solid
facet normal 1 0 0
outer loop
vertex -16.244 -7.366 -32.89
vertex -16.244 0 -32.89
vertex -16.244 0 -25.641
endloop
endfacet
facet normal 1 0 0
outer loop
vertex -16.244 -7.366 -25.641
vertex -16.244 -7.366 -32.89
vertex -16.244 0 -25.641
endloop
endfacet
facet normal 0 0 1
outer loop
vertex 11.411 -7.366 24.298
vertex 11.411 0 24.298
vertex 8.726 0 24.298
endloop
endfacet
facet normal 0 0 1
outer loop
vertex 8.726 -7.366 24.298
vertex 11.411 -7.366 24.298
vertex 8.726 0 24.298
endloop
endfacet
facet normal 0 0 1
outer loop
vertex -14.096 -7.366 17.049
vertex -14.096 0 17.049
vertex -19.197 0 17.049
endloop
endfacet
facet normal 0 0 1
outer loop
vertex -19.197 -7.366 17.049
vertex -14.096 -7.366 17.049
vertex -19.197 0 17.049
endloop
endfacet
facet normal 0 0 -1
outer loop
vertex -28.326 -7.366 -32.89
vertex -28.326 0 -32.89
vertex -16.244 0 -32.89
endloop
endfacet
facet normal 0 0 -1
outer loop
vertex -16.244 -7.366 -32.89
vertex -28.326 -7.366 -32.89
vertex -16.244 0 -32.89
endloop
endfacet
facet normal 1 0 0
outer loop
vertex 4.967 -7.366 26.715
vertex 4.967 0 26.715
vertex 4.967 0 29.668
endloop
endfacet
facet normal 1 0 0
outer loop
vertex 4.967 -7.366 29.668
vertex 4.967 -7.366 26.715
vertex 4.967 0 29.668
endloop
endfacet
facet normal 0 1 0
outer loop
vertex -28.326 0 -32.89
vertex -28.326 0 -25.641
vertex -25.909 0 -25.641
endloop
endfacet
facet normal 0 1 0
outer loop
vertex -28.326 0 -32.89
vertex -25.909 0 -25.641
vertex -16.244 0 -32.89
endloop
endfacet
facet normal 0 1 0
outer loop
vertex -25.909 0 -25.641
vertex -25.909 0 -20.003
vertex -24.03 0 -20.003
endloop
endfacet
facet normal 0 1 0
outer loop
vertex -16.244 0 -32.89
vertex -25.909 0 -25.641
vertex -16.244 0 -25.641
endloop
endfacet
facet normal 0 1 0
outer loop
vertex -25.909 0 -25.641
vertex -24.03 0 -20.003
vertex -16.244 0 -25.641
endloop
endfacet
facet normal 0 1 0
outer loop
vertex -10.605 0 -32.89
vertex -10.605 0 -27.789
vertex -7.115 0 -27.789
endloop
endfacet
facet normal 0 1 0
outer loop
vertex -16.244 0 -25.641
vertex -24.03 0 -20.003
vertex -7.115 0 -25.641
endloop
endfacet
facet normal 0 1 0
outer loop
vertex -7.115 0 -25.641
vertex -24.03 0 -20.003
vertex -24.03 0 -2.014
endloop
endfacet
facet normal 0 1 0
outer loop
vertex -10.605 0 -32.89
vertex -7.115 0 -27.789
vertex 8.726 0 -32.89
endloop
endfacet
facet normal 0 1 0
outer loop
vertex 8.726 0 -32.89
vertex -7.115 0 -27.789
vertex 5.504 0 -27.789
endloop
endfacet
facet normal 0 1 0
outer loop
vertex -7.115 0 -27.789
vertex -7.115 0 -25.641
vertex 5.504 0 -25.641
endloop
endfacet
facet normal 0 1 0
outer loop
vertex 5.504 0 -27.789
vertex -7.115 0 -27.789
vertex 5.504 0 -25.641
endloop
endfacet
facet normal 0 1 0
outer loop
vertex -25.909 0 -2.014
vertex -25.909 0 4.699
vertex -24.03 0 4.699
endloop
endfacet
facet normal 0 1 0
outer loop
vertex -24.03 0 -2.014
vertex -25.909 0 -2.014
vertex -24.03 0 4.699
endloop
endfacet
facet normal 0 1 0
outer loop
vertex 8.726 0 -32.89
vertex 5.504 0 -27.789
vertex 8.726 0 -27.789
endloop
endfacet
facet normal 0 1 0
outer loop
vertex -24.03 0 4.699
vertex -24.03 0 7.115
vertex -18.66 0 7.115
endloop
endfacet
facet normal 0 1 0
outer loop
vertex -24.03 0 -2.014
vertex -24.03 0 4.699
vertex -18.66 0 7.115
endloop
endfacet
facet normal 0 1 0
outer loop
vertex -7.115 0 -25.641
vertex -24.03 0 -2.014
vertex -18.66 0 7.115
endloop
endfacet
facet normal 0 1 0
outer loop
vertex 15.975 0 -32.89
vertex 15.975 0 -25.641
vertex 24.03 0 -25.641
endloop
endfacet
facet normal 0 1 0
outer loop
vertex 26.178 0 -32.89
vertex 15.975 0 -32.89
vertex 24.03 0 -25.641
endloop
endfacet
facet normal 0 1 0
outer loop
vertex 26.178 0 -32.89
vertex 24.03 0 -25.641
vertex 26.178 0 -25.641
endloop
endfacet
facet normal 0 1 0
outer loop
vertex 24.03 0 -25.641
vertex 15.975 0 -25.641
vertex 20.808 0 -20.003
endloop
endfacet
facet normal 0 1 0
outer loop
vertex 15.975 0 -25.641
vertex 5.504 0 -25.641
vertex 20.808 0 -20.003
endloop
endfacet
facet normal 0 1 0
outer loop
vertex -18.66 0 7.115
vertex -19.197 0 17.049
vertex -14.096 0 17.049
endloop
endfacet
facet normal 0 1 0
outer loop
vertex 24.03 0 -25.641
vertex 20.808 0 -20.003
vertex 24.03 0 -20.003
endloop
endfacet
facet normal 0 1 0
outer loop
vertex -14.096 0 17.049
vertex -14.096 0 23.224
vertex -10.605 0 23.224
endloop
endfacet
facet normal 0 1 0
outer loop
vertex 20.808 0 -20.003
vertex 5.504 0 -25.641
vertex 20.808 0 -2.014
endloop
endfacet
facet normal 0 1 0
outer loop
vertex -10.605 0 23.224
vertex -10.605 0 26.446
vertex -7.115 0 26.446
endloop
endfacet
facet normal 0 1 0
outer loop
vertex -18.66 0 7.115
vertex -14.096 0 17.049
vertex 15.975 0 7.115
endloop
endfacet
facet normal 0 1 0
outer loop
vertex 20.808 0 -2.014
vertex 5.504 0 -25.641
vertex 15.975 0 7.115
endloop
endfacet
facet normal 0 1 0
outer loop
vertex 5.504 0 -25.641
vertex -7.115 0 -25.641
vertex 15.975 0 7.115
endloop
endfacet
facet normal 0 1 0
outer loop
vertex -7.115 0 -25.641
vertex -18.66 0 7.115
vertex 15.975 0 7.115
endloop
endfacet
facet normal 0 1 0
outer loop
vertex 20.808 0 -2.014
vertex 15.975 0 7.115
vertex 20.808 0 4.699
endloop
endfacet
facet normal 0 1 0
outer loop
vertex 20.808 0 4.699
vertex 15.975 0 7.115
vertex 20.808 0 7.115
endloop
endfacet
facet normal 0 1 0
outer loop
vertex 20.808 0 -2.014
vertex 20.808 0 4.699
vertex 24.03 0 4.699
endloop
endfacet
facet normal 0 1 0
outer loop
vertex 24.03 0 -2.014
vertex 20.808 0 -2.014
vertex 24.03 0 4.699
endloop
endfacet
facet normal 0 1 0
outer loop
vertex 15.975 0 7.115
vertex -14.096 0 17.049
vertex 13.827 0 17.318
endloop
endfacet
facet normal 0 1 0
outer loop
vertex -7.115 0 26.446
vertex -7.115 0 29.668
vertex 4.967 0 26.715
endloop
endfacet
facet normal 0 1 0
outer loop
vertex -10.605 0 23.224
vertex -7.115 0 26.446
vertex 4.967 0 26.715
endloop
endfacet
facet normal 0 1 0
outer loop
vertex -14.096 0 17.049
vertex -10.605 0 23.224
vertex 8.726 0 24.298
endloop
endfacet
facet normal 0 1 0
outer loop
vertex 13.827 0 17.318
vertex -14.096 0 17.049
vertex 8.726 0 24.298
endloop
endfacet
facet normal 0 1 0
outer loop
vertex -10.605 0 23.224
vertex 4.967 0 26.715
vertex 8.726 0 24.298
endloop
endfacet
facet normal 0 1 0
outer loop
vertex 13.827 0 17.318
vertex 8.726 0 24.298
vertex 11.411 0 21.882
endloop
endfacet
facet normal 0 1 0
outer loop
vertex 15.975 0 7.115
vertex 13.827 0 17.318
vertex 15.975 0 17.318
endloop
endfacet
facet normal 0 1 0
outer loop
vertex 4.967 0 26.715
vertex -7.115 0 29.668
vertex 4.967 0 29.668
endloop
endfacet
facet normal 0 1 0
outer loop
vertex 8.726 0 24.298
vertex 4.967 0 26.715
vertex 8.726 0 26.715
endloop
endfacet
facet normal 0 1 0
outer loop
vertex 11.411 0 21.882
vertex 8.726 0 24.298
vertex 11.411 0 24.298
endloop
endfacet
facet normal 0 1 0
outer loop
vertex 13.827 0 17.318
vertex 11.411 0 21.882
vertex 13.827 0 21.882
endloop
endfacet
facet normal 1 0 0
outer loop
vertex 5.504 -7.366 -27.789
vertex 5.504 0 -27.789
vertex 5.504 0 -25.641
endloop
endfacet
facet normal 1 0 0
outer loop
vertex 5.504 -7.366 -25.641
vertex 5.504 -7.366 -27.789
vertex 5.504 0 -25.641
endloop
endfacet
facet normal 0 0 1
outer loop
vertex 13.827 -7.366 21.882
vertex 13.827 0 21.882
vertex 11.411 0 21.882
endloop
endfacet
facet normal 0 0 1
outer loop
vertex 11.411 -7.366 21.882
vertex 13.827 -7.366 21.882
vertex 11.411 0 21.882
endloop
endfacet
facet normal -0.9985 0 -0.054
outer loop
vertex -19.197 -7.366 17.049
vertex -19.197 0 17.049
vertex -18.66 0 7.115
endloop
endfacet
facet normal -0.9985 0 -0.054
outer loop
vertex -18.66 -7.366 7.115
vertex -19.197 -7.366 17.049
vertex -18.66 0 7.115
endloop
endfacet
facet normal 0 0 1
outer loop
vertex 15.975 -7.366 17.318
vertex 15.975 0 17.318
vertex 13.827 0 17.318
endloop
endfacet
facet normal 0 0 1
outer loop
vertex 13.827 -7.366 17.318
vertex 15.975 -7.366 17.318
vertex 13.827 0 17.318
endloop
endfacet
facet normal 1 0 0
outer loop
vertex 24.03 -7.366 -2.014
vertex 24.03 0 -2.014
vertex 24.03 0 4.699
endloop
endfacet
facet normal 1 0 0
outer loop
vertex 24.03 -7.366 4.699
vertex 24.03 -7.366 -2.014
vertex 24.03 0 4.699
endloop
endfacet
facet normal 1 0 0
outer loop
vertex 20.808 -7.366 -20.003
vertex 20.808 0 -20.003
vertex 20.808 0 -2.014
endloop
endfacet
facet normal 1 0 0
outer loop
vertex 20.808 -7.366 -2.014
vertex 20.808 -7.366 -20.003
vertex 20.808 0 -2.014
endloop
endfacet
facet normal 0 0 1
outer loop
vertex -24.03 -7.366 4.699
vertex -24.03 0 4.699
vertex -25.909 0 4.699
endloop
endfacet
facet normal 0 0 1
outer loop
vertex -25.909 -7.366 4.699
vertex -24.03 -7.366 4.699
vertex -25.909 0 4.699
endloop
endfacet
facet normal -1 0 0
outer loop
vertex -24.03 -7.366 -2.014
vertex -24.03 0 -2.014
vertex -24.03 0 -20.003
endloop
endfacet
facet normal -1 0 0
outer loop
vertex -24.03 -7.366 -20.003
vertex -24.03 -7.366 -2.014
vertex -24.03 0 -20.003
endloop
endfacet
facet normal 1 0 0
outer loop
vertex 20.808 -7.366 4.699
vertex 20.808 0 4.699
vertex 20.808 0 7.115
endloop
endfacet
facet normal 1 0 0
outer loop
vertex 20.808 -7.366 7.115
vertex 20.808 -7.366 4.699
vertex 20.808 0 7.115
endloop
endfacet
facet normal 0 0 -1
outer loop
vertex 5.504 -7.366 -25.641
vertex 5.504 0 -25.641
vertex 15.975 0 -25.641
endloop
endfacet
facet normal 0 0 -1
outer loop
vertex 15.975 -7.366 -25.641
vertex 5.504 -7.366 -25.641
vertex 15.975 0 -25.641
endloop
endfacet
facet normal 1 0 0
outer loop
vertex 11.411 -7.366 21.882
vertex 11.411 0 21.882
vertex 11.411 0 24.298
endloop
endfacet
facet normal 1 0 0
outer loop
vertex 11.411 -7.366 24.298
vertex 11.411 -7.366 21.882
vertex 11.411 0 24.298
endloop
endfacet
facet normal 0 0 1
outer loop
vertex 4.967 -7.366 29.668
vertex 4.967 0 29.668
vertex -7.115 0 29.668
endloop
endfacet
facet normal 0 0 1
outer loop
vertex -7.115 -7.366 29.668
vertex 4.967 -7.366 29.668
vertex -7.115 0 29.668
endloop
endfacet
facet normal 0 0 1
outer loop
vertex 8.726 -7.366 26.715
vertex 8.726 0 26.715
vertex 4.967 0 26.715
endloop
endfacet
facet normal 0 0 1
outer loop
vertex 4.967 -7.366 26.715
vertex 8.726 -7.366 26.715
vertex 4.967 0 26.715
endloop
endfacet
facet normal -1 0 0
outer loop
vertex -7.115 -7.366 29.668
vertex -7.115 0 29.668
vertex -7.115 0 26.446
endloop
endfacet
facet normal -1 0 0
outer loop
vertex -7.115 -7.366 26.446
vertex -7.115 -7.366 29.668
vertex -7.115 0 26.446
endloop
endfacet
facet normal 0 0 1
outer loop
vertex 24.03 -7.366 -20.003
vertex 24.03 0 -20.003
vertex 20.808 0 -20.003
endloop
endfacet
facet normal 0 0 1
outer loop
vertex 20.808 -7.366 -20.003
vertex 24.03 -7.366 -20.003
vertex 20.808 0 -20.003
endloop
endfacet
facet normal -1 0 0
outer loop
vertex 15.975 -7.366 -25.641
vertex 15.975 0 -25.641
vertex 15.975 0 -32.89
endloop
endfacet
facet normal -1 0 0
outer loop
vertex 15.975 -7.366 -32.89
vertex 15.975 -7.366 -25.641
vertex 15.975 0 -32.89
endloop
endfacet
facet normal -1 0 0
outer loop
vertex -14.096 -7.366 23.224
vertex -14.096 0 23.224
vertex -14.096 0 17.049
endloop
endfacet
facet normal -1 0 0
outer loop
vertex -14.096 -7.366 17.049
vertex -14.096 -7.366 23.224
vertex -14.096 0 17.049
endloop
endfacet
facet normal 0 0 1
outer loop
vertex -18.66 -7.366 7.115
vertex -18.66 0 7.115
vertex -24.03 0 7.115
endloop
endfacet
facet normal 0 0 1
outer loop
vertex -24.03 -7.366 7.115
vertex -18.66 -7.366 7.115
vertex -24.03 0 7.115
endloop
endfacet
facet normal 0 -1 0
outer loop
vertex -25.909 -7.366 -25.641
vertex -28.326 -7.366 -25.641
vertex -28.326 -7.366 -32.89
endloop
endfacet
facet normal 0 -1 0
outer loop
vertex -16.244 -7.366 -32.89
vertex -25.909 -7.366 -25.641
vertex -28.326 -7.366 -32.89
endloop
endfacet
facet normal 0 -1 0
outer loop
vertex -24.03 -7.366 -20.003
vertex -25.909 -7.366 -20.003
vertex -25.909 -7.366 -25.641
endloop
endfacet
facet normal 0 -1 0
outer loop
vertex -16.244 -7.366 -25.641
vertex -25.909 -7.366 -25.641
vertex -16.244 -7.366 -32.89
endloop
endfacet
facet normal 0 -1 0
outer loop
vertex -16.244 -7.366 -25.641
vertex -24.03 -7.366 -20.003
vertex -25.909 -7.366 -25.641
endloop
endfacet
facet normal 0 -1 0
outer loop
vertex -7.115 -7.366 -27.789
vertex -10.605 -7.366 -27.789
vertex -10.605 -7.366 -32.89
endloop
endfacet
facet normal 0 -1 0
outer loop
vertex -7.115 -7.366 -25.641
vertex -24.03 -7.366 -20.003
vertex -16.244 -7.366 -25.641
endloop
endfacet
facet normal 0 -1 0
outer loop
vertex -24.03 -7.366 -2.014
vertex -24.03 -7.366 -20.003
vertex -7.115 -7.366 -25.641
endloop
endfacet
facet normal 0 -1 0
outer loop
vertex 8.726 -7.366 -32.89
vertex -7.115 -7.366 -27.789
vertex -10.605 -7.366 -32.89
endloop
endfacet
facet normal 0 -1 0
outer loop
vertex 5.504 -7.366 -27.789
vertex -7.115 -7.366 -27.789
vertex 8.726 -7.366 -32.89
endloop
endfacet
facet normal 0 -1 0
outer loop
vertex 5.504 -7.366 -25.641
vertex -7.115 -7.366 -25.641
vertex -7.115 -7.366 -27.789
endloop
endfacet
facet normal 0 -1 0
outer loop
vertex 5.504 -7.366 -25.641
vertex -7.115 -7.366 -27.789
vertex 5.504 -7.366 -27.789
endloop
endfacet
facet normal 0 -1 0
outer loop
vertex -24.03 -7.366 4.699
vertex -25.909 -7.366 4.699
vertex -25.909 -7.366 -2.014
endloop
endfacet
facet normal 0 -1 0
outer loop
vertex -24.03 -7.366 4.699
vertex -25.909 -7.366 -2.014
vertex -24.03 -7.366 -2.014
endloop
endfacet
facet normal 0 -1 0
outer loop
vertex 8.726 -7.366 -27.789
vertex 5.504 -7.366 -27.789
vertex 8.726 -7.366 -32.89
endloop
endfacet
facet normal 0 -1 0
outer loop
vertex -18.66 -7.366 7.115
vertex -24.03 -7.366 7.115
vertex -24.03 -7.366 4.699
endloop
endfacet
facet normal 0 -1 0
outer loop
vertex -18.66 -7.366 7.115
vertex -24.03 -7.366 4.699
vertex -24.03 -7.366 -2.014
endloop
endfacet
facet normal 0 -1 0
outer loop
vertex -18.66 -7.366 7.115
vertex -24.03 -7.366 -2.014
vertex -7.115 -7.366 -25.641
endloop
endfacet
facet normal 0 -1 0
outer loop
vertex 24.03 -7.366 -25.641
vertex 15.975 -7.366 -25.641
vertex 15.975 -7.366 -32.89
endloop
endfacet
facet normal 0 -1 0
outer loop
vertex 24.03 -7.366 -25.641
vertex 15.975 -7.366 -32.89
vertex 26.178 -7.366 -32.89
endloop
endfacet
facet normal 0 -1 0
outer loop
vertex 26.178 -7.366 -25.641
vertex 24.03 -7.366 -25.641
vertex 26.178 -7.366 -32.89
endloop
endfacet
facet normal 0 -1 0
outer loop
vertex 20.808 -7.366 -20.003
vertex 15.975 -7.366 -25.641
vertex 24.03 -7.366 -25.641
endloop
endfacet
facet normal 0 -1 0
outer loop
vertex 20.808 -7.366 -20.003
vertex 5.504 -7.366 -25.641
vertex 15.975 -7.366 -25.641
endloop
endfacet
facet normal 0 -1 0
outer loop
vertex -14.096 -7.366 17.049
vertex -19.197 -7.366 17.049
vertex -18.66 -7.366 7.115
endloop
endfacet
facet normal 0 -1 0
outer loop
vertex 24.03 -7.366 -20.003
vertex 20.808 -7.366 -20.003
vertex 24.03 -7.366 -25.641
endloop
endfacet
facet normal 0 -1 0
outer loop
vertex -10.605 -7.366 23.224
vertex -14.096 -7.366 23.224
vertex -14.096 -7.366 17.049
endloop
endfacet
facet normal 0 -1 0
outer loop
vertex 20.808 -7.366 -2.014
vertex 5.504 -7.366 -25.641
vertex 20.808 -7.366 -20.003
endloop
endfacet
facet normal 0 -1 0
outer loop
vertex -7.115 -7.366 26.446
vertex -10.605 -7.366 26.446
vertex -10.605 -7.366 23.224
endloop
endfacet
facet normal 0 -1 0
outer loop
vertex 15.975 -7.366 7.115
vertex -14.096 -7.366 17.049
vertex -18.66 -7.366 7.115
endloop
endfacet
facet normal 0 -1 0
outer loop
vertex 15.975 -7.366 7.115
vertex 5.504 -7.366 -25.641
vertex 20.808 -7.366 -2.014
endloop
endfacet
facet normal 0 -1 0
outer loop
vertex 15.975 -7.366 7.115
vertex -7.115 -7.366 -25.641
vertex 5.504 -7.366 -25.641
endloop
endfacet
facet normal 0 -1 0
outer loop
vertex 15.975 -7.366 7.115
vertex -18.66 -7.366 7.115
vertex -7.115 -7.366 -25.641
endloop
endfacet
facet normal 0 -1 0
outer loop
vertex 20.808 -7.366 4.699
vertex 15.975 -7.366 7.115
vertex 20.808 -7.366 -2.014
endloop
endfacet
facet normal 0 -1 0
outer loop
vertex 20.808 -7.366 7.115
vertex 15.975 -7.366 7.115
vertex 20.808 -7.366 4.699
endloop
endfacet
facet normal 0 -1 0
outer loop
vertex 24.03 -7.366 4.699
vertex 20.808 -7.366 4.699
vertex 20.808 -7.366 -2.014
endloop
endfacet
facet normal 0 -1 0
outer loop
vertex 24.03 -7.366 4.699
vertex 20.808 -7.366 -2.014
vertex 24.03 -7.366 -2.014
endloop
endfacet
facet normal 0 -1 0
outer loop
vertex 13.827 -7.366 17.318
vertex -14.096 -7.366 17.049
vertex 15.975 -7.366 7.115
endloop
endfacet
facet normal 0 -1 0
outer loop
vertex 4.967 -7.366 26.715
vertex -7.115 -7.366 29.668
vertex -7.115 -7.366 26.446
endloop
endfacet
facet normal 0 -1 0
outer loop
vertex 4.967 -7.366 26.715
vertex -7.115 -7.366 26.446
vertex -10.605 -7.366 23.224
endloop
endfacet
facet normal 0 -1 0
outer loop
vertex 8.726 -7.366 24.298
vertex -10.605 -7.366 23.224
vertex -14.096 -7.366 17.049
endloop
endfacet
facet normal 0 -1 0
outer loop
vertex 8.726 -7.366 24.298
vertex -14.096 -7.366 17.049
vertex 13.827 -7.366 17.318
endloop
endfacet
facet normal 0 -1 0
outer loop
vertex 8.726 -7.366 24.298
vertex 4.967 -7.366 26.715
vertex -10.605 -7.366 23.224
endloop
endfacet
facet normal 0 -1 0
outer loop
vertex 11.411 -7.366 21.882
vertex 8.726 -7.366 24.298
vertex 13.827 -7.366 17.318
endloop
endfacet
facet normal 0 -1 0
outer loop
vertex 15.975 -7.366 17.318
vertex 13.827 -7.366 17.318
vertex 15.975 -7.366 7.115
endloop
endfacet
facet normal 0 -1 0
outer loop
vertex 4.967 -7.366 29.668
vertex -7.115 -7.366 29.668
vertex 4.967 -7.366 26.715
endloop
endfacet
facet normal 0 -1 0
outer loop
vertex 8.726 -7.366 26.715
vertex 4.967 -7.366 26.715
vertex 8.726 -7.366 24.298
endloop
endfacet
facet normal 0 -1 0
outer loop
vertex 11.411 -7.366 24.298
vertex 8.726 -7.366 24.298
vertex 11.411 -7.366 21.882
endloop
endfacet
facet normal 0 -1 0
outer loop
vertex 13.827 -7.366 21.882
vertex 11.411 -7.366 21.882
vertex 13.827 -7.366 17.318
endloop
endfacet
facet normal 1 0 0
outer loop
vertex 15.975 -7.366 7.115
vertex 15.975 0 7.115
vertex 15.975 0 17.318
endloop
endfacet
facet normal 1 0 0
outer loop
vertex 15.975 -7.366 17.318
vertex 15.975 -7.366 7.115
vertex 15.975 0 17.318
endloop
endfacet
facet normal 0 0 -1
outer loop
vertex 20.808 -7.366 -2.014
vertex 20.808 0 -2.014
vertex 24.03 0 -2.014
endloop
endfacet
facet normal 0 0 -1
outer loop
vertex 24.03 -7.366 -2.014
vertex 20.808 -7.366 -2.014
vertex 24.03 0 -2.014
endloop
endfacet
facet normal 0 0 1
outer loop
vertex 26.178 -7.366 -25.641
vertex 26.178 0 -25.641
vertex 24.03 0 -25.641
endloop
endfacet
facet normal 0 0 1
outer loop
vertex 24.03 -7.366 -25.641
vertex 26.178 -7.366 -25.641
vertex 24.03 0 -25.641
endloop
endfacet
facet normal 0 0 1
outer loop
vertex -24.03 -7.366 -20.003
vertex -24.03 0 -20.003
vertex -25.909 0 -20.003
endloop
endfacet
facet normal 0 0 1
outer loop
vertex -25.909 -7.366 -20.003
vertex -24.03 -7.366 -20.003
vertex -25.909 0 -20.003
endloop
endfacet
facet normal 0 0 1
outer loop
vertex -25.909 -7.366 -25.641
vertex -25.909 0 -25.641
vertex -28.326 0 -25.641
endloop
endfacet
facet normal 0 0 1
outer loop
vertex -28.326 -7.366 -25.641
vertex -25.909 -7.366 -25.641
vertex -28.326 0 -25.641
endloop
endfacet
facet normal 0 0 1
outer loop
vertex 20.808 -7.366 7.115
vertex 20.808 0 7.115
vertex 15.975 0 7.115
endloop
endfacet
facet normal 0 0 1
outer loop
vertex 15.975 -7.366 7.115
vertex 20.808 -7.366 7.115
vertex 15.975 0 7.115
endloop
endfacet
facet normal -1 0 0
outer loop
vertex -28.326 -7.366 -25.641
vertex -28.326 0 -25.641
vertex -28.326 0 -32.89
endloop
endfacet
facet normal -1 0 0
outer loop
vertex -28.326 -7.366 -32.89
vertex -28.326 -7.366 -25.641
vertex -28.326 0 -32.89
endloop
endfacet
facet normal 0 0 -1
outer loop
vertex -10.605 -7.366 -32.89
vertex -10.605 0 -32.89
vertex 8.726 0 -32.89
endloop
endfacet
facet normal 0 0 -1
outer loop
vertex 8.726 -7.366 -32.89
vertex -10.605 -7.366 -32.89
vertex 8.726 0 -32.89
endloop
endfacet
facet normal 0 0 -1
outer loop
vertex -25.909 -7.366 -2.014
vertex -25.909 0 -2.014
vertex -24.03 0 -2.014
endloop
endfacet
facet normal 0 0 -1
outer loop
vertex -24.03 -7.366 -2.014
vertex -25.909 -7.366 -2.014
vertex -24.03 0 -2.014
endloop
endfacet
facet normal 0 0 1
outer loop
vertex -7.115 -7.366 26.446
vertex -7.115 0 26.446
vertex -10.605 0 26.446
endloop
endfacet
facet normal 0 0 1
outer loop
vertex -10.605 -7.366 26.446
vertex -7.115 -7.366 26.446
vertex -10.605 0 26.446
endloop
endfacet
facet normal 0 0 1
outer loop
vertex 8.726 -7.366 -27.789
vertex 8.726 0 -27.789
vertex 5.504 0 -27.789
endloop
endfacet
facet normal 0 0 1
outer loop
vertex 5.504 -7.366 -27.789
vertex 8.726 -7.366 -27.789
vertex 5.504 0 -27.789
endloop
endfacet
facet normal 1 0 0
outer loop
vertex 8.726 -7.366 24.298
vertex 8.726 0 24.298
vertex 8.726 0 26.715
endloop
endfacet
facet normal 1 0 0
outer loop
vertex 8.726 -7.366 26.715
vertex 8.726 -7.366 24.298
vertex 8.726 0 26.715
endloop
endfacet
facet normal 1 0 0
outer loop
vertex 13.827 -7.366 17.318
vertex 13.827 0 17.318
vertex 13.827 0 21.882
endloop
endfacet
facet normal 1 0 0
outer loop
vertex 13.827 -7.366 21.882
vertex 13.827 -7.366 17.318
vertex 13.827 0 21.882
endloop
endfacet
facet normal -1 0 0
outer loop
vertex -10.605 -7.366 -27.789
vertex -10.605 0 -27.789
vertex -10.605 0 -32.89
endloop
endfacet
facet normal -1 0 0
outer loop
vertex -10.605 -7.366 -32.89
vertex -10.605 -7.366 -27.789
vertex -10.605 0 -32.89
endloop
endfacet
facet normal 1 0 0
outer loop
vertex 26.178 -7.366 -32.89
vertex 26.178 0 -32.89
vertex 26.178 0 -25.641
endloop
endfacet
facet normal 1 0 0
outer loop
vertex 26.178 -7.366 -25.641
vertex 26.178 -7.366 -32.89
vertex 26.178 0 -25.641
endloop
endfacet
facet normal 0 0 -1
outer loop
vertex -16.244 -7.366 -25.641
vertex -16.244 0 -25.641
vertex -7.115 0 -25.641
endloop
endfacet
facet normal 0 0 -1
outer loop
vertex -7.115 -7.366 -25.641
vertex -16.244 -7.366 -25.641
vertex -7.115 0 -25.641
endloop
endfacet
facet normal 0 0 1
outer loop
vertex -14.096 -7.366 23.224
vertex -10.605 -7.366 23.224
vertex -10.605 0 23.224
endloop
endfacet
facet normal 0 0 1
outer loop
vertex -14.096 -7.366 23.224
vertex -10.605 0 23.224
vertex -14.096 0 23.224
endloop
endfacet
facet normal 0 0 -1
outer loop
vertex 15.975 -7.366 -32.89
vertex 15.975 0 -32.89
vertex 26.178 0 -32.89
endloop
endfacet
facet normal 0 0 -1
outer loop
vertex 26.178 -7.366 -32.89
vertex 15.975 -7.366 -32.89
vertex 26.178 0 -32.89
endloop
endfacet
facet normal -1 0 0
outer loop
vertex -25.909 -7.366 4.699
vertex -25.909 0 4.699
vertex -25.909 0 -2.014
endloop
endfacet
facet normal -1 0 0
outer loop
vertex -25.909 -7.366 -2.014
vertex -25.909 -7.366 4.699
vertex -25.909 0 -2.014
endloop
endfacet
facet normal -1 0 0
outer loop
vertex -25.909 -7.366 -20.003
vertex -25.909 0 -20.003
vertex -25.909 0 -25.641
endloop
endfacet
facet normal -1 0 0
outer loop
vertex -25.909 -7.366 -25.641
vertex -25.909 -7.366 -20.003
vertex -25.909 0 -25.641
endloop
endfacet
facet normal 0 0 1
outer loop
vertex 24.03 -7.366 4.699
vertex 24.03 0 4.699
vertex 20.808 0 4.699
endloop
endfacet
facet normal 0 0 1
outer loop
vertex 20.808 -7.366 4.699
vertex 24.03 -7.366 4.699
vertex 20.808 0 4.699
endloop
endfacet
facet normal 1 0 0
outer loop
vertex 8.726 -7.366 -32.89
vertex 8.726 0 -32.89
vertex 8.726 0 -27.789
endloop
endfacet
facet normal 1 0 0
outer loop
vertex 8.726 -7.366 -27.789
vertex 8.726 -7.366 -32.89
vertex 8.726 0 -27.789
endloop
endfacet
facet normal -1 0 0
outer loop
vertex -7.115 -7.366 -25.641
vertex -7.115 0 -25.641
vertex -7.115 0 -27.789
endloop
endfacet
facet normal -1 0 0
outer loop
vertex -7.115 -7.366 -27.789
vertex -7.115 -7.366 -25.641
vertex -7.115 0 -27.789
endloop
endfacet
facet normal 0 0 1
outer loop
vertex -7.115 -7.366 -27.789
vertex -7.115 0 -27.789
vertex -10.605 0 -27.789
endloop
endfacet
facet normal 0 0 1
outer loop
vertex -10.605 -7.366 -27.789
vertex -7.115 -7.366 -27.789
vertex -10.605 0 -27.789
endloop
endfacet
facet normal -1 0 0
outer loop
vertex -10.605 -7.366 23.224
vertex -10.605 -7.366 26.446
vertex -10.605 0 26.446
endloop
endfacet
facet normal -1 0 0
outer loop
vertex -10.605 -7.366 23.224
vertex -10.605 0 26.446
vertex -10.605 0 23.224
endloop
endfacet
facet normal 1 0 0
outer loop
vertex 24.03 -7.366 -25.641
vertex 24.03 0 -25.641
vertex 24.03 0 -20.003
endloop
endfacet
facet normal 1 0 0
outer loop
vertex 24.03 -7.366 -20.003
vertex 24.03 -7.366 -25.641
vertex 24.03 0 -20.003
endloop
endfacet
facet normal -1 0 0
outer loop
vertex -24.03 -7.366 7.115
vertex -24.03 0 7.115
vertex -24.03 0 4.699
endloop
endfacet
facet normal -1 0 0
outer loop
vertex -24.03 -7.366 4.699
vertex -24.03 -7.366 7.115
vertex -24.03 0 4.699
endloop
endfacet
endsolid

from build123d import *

# Parameters (mm, degrees)
F1_DEPTH = 7.366


with BuildPart() as f1:
    # F0 (on Front) → F1 (new body)
    with BuildSketch(Plane.XZ):
        Polygon((4.967066, 29.668139), (-3.087636, 29.668139), (-7.114984, 29.668139), (-7.114984, 26.446259), (-10.605352, 26.446259), (-10.605352, 23.22438), (-14.095721, 23.22438), (-14.095721, 17.049111), (-19.197032, 17.049111), (-18.66005, 7.114983), (-24.029849, 7.114983), (-24.029849, 4.698574), (-25.909279, 4.698574), (-25.909279, -2.013674), (-24.029849, -2.013674), (-24.029849, -20.002501), (-25.909279, -20.002501), (-25.909279, -25.640789), (-28.325688, -25.640789), (-28.325688, -27.788708), (-28.325688, -32.890018), (-16.24364, -32.890018), (-16.24364, -25.640789), (-7.114984, -25.640789), (-7.114984, -27.788708), (-10.605352, -27.788708), (-10.605352, -32.890018), (8.725923, -32.890018), (8.725923, -27.788708), (5.504044, -27.788708), (5.504044, -25.640789), (15.975151, -25.640789), (15.975151, -32.890018), (26.177768, -32.890018), (26.177768, -25.640789), (24.029847, -25.640789), (24.029847, -20.002501), (20.80797, -20.002501), (20.80797, -2.013674), (24.029847, -2.013674), (24.029847, 4.698574), (20.80797, 4.698574), (20.80797, 7.114983), (15.975151, 7.114983), (15.975151, 17.317601), (13.827233, 17.317601), (13.827233, 21.881929), (11.410821, 21.881929), (11.410821, 24.298338), (8.725923, 24.298338), (8.725923, 26.714748), (4.967066, 26.714748), align=None)
    extrude(amount=F1_DEPTH)


solid = f1.part
